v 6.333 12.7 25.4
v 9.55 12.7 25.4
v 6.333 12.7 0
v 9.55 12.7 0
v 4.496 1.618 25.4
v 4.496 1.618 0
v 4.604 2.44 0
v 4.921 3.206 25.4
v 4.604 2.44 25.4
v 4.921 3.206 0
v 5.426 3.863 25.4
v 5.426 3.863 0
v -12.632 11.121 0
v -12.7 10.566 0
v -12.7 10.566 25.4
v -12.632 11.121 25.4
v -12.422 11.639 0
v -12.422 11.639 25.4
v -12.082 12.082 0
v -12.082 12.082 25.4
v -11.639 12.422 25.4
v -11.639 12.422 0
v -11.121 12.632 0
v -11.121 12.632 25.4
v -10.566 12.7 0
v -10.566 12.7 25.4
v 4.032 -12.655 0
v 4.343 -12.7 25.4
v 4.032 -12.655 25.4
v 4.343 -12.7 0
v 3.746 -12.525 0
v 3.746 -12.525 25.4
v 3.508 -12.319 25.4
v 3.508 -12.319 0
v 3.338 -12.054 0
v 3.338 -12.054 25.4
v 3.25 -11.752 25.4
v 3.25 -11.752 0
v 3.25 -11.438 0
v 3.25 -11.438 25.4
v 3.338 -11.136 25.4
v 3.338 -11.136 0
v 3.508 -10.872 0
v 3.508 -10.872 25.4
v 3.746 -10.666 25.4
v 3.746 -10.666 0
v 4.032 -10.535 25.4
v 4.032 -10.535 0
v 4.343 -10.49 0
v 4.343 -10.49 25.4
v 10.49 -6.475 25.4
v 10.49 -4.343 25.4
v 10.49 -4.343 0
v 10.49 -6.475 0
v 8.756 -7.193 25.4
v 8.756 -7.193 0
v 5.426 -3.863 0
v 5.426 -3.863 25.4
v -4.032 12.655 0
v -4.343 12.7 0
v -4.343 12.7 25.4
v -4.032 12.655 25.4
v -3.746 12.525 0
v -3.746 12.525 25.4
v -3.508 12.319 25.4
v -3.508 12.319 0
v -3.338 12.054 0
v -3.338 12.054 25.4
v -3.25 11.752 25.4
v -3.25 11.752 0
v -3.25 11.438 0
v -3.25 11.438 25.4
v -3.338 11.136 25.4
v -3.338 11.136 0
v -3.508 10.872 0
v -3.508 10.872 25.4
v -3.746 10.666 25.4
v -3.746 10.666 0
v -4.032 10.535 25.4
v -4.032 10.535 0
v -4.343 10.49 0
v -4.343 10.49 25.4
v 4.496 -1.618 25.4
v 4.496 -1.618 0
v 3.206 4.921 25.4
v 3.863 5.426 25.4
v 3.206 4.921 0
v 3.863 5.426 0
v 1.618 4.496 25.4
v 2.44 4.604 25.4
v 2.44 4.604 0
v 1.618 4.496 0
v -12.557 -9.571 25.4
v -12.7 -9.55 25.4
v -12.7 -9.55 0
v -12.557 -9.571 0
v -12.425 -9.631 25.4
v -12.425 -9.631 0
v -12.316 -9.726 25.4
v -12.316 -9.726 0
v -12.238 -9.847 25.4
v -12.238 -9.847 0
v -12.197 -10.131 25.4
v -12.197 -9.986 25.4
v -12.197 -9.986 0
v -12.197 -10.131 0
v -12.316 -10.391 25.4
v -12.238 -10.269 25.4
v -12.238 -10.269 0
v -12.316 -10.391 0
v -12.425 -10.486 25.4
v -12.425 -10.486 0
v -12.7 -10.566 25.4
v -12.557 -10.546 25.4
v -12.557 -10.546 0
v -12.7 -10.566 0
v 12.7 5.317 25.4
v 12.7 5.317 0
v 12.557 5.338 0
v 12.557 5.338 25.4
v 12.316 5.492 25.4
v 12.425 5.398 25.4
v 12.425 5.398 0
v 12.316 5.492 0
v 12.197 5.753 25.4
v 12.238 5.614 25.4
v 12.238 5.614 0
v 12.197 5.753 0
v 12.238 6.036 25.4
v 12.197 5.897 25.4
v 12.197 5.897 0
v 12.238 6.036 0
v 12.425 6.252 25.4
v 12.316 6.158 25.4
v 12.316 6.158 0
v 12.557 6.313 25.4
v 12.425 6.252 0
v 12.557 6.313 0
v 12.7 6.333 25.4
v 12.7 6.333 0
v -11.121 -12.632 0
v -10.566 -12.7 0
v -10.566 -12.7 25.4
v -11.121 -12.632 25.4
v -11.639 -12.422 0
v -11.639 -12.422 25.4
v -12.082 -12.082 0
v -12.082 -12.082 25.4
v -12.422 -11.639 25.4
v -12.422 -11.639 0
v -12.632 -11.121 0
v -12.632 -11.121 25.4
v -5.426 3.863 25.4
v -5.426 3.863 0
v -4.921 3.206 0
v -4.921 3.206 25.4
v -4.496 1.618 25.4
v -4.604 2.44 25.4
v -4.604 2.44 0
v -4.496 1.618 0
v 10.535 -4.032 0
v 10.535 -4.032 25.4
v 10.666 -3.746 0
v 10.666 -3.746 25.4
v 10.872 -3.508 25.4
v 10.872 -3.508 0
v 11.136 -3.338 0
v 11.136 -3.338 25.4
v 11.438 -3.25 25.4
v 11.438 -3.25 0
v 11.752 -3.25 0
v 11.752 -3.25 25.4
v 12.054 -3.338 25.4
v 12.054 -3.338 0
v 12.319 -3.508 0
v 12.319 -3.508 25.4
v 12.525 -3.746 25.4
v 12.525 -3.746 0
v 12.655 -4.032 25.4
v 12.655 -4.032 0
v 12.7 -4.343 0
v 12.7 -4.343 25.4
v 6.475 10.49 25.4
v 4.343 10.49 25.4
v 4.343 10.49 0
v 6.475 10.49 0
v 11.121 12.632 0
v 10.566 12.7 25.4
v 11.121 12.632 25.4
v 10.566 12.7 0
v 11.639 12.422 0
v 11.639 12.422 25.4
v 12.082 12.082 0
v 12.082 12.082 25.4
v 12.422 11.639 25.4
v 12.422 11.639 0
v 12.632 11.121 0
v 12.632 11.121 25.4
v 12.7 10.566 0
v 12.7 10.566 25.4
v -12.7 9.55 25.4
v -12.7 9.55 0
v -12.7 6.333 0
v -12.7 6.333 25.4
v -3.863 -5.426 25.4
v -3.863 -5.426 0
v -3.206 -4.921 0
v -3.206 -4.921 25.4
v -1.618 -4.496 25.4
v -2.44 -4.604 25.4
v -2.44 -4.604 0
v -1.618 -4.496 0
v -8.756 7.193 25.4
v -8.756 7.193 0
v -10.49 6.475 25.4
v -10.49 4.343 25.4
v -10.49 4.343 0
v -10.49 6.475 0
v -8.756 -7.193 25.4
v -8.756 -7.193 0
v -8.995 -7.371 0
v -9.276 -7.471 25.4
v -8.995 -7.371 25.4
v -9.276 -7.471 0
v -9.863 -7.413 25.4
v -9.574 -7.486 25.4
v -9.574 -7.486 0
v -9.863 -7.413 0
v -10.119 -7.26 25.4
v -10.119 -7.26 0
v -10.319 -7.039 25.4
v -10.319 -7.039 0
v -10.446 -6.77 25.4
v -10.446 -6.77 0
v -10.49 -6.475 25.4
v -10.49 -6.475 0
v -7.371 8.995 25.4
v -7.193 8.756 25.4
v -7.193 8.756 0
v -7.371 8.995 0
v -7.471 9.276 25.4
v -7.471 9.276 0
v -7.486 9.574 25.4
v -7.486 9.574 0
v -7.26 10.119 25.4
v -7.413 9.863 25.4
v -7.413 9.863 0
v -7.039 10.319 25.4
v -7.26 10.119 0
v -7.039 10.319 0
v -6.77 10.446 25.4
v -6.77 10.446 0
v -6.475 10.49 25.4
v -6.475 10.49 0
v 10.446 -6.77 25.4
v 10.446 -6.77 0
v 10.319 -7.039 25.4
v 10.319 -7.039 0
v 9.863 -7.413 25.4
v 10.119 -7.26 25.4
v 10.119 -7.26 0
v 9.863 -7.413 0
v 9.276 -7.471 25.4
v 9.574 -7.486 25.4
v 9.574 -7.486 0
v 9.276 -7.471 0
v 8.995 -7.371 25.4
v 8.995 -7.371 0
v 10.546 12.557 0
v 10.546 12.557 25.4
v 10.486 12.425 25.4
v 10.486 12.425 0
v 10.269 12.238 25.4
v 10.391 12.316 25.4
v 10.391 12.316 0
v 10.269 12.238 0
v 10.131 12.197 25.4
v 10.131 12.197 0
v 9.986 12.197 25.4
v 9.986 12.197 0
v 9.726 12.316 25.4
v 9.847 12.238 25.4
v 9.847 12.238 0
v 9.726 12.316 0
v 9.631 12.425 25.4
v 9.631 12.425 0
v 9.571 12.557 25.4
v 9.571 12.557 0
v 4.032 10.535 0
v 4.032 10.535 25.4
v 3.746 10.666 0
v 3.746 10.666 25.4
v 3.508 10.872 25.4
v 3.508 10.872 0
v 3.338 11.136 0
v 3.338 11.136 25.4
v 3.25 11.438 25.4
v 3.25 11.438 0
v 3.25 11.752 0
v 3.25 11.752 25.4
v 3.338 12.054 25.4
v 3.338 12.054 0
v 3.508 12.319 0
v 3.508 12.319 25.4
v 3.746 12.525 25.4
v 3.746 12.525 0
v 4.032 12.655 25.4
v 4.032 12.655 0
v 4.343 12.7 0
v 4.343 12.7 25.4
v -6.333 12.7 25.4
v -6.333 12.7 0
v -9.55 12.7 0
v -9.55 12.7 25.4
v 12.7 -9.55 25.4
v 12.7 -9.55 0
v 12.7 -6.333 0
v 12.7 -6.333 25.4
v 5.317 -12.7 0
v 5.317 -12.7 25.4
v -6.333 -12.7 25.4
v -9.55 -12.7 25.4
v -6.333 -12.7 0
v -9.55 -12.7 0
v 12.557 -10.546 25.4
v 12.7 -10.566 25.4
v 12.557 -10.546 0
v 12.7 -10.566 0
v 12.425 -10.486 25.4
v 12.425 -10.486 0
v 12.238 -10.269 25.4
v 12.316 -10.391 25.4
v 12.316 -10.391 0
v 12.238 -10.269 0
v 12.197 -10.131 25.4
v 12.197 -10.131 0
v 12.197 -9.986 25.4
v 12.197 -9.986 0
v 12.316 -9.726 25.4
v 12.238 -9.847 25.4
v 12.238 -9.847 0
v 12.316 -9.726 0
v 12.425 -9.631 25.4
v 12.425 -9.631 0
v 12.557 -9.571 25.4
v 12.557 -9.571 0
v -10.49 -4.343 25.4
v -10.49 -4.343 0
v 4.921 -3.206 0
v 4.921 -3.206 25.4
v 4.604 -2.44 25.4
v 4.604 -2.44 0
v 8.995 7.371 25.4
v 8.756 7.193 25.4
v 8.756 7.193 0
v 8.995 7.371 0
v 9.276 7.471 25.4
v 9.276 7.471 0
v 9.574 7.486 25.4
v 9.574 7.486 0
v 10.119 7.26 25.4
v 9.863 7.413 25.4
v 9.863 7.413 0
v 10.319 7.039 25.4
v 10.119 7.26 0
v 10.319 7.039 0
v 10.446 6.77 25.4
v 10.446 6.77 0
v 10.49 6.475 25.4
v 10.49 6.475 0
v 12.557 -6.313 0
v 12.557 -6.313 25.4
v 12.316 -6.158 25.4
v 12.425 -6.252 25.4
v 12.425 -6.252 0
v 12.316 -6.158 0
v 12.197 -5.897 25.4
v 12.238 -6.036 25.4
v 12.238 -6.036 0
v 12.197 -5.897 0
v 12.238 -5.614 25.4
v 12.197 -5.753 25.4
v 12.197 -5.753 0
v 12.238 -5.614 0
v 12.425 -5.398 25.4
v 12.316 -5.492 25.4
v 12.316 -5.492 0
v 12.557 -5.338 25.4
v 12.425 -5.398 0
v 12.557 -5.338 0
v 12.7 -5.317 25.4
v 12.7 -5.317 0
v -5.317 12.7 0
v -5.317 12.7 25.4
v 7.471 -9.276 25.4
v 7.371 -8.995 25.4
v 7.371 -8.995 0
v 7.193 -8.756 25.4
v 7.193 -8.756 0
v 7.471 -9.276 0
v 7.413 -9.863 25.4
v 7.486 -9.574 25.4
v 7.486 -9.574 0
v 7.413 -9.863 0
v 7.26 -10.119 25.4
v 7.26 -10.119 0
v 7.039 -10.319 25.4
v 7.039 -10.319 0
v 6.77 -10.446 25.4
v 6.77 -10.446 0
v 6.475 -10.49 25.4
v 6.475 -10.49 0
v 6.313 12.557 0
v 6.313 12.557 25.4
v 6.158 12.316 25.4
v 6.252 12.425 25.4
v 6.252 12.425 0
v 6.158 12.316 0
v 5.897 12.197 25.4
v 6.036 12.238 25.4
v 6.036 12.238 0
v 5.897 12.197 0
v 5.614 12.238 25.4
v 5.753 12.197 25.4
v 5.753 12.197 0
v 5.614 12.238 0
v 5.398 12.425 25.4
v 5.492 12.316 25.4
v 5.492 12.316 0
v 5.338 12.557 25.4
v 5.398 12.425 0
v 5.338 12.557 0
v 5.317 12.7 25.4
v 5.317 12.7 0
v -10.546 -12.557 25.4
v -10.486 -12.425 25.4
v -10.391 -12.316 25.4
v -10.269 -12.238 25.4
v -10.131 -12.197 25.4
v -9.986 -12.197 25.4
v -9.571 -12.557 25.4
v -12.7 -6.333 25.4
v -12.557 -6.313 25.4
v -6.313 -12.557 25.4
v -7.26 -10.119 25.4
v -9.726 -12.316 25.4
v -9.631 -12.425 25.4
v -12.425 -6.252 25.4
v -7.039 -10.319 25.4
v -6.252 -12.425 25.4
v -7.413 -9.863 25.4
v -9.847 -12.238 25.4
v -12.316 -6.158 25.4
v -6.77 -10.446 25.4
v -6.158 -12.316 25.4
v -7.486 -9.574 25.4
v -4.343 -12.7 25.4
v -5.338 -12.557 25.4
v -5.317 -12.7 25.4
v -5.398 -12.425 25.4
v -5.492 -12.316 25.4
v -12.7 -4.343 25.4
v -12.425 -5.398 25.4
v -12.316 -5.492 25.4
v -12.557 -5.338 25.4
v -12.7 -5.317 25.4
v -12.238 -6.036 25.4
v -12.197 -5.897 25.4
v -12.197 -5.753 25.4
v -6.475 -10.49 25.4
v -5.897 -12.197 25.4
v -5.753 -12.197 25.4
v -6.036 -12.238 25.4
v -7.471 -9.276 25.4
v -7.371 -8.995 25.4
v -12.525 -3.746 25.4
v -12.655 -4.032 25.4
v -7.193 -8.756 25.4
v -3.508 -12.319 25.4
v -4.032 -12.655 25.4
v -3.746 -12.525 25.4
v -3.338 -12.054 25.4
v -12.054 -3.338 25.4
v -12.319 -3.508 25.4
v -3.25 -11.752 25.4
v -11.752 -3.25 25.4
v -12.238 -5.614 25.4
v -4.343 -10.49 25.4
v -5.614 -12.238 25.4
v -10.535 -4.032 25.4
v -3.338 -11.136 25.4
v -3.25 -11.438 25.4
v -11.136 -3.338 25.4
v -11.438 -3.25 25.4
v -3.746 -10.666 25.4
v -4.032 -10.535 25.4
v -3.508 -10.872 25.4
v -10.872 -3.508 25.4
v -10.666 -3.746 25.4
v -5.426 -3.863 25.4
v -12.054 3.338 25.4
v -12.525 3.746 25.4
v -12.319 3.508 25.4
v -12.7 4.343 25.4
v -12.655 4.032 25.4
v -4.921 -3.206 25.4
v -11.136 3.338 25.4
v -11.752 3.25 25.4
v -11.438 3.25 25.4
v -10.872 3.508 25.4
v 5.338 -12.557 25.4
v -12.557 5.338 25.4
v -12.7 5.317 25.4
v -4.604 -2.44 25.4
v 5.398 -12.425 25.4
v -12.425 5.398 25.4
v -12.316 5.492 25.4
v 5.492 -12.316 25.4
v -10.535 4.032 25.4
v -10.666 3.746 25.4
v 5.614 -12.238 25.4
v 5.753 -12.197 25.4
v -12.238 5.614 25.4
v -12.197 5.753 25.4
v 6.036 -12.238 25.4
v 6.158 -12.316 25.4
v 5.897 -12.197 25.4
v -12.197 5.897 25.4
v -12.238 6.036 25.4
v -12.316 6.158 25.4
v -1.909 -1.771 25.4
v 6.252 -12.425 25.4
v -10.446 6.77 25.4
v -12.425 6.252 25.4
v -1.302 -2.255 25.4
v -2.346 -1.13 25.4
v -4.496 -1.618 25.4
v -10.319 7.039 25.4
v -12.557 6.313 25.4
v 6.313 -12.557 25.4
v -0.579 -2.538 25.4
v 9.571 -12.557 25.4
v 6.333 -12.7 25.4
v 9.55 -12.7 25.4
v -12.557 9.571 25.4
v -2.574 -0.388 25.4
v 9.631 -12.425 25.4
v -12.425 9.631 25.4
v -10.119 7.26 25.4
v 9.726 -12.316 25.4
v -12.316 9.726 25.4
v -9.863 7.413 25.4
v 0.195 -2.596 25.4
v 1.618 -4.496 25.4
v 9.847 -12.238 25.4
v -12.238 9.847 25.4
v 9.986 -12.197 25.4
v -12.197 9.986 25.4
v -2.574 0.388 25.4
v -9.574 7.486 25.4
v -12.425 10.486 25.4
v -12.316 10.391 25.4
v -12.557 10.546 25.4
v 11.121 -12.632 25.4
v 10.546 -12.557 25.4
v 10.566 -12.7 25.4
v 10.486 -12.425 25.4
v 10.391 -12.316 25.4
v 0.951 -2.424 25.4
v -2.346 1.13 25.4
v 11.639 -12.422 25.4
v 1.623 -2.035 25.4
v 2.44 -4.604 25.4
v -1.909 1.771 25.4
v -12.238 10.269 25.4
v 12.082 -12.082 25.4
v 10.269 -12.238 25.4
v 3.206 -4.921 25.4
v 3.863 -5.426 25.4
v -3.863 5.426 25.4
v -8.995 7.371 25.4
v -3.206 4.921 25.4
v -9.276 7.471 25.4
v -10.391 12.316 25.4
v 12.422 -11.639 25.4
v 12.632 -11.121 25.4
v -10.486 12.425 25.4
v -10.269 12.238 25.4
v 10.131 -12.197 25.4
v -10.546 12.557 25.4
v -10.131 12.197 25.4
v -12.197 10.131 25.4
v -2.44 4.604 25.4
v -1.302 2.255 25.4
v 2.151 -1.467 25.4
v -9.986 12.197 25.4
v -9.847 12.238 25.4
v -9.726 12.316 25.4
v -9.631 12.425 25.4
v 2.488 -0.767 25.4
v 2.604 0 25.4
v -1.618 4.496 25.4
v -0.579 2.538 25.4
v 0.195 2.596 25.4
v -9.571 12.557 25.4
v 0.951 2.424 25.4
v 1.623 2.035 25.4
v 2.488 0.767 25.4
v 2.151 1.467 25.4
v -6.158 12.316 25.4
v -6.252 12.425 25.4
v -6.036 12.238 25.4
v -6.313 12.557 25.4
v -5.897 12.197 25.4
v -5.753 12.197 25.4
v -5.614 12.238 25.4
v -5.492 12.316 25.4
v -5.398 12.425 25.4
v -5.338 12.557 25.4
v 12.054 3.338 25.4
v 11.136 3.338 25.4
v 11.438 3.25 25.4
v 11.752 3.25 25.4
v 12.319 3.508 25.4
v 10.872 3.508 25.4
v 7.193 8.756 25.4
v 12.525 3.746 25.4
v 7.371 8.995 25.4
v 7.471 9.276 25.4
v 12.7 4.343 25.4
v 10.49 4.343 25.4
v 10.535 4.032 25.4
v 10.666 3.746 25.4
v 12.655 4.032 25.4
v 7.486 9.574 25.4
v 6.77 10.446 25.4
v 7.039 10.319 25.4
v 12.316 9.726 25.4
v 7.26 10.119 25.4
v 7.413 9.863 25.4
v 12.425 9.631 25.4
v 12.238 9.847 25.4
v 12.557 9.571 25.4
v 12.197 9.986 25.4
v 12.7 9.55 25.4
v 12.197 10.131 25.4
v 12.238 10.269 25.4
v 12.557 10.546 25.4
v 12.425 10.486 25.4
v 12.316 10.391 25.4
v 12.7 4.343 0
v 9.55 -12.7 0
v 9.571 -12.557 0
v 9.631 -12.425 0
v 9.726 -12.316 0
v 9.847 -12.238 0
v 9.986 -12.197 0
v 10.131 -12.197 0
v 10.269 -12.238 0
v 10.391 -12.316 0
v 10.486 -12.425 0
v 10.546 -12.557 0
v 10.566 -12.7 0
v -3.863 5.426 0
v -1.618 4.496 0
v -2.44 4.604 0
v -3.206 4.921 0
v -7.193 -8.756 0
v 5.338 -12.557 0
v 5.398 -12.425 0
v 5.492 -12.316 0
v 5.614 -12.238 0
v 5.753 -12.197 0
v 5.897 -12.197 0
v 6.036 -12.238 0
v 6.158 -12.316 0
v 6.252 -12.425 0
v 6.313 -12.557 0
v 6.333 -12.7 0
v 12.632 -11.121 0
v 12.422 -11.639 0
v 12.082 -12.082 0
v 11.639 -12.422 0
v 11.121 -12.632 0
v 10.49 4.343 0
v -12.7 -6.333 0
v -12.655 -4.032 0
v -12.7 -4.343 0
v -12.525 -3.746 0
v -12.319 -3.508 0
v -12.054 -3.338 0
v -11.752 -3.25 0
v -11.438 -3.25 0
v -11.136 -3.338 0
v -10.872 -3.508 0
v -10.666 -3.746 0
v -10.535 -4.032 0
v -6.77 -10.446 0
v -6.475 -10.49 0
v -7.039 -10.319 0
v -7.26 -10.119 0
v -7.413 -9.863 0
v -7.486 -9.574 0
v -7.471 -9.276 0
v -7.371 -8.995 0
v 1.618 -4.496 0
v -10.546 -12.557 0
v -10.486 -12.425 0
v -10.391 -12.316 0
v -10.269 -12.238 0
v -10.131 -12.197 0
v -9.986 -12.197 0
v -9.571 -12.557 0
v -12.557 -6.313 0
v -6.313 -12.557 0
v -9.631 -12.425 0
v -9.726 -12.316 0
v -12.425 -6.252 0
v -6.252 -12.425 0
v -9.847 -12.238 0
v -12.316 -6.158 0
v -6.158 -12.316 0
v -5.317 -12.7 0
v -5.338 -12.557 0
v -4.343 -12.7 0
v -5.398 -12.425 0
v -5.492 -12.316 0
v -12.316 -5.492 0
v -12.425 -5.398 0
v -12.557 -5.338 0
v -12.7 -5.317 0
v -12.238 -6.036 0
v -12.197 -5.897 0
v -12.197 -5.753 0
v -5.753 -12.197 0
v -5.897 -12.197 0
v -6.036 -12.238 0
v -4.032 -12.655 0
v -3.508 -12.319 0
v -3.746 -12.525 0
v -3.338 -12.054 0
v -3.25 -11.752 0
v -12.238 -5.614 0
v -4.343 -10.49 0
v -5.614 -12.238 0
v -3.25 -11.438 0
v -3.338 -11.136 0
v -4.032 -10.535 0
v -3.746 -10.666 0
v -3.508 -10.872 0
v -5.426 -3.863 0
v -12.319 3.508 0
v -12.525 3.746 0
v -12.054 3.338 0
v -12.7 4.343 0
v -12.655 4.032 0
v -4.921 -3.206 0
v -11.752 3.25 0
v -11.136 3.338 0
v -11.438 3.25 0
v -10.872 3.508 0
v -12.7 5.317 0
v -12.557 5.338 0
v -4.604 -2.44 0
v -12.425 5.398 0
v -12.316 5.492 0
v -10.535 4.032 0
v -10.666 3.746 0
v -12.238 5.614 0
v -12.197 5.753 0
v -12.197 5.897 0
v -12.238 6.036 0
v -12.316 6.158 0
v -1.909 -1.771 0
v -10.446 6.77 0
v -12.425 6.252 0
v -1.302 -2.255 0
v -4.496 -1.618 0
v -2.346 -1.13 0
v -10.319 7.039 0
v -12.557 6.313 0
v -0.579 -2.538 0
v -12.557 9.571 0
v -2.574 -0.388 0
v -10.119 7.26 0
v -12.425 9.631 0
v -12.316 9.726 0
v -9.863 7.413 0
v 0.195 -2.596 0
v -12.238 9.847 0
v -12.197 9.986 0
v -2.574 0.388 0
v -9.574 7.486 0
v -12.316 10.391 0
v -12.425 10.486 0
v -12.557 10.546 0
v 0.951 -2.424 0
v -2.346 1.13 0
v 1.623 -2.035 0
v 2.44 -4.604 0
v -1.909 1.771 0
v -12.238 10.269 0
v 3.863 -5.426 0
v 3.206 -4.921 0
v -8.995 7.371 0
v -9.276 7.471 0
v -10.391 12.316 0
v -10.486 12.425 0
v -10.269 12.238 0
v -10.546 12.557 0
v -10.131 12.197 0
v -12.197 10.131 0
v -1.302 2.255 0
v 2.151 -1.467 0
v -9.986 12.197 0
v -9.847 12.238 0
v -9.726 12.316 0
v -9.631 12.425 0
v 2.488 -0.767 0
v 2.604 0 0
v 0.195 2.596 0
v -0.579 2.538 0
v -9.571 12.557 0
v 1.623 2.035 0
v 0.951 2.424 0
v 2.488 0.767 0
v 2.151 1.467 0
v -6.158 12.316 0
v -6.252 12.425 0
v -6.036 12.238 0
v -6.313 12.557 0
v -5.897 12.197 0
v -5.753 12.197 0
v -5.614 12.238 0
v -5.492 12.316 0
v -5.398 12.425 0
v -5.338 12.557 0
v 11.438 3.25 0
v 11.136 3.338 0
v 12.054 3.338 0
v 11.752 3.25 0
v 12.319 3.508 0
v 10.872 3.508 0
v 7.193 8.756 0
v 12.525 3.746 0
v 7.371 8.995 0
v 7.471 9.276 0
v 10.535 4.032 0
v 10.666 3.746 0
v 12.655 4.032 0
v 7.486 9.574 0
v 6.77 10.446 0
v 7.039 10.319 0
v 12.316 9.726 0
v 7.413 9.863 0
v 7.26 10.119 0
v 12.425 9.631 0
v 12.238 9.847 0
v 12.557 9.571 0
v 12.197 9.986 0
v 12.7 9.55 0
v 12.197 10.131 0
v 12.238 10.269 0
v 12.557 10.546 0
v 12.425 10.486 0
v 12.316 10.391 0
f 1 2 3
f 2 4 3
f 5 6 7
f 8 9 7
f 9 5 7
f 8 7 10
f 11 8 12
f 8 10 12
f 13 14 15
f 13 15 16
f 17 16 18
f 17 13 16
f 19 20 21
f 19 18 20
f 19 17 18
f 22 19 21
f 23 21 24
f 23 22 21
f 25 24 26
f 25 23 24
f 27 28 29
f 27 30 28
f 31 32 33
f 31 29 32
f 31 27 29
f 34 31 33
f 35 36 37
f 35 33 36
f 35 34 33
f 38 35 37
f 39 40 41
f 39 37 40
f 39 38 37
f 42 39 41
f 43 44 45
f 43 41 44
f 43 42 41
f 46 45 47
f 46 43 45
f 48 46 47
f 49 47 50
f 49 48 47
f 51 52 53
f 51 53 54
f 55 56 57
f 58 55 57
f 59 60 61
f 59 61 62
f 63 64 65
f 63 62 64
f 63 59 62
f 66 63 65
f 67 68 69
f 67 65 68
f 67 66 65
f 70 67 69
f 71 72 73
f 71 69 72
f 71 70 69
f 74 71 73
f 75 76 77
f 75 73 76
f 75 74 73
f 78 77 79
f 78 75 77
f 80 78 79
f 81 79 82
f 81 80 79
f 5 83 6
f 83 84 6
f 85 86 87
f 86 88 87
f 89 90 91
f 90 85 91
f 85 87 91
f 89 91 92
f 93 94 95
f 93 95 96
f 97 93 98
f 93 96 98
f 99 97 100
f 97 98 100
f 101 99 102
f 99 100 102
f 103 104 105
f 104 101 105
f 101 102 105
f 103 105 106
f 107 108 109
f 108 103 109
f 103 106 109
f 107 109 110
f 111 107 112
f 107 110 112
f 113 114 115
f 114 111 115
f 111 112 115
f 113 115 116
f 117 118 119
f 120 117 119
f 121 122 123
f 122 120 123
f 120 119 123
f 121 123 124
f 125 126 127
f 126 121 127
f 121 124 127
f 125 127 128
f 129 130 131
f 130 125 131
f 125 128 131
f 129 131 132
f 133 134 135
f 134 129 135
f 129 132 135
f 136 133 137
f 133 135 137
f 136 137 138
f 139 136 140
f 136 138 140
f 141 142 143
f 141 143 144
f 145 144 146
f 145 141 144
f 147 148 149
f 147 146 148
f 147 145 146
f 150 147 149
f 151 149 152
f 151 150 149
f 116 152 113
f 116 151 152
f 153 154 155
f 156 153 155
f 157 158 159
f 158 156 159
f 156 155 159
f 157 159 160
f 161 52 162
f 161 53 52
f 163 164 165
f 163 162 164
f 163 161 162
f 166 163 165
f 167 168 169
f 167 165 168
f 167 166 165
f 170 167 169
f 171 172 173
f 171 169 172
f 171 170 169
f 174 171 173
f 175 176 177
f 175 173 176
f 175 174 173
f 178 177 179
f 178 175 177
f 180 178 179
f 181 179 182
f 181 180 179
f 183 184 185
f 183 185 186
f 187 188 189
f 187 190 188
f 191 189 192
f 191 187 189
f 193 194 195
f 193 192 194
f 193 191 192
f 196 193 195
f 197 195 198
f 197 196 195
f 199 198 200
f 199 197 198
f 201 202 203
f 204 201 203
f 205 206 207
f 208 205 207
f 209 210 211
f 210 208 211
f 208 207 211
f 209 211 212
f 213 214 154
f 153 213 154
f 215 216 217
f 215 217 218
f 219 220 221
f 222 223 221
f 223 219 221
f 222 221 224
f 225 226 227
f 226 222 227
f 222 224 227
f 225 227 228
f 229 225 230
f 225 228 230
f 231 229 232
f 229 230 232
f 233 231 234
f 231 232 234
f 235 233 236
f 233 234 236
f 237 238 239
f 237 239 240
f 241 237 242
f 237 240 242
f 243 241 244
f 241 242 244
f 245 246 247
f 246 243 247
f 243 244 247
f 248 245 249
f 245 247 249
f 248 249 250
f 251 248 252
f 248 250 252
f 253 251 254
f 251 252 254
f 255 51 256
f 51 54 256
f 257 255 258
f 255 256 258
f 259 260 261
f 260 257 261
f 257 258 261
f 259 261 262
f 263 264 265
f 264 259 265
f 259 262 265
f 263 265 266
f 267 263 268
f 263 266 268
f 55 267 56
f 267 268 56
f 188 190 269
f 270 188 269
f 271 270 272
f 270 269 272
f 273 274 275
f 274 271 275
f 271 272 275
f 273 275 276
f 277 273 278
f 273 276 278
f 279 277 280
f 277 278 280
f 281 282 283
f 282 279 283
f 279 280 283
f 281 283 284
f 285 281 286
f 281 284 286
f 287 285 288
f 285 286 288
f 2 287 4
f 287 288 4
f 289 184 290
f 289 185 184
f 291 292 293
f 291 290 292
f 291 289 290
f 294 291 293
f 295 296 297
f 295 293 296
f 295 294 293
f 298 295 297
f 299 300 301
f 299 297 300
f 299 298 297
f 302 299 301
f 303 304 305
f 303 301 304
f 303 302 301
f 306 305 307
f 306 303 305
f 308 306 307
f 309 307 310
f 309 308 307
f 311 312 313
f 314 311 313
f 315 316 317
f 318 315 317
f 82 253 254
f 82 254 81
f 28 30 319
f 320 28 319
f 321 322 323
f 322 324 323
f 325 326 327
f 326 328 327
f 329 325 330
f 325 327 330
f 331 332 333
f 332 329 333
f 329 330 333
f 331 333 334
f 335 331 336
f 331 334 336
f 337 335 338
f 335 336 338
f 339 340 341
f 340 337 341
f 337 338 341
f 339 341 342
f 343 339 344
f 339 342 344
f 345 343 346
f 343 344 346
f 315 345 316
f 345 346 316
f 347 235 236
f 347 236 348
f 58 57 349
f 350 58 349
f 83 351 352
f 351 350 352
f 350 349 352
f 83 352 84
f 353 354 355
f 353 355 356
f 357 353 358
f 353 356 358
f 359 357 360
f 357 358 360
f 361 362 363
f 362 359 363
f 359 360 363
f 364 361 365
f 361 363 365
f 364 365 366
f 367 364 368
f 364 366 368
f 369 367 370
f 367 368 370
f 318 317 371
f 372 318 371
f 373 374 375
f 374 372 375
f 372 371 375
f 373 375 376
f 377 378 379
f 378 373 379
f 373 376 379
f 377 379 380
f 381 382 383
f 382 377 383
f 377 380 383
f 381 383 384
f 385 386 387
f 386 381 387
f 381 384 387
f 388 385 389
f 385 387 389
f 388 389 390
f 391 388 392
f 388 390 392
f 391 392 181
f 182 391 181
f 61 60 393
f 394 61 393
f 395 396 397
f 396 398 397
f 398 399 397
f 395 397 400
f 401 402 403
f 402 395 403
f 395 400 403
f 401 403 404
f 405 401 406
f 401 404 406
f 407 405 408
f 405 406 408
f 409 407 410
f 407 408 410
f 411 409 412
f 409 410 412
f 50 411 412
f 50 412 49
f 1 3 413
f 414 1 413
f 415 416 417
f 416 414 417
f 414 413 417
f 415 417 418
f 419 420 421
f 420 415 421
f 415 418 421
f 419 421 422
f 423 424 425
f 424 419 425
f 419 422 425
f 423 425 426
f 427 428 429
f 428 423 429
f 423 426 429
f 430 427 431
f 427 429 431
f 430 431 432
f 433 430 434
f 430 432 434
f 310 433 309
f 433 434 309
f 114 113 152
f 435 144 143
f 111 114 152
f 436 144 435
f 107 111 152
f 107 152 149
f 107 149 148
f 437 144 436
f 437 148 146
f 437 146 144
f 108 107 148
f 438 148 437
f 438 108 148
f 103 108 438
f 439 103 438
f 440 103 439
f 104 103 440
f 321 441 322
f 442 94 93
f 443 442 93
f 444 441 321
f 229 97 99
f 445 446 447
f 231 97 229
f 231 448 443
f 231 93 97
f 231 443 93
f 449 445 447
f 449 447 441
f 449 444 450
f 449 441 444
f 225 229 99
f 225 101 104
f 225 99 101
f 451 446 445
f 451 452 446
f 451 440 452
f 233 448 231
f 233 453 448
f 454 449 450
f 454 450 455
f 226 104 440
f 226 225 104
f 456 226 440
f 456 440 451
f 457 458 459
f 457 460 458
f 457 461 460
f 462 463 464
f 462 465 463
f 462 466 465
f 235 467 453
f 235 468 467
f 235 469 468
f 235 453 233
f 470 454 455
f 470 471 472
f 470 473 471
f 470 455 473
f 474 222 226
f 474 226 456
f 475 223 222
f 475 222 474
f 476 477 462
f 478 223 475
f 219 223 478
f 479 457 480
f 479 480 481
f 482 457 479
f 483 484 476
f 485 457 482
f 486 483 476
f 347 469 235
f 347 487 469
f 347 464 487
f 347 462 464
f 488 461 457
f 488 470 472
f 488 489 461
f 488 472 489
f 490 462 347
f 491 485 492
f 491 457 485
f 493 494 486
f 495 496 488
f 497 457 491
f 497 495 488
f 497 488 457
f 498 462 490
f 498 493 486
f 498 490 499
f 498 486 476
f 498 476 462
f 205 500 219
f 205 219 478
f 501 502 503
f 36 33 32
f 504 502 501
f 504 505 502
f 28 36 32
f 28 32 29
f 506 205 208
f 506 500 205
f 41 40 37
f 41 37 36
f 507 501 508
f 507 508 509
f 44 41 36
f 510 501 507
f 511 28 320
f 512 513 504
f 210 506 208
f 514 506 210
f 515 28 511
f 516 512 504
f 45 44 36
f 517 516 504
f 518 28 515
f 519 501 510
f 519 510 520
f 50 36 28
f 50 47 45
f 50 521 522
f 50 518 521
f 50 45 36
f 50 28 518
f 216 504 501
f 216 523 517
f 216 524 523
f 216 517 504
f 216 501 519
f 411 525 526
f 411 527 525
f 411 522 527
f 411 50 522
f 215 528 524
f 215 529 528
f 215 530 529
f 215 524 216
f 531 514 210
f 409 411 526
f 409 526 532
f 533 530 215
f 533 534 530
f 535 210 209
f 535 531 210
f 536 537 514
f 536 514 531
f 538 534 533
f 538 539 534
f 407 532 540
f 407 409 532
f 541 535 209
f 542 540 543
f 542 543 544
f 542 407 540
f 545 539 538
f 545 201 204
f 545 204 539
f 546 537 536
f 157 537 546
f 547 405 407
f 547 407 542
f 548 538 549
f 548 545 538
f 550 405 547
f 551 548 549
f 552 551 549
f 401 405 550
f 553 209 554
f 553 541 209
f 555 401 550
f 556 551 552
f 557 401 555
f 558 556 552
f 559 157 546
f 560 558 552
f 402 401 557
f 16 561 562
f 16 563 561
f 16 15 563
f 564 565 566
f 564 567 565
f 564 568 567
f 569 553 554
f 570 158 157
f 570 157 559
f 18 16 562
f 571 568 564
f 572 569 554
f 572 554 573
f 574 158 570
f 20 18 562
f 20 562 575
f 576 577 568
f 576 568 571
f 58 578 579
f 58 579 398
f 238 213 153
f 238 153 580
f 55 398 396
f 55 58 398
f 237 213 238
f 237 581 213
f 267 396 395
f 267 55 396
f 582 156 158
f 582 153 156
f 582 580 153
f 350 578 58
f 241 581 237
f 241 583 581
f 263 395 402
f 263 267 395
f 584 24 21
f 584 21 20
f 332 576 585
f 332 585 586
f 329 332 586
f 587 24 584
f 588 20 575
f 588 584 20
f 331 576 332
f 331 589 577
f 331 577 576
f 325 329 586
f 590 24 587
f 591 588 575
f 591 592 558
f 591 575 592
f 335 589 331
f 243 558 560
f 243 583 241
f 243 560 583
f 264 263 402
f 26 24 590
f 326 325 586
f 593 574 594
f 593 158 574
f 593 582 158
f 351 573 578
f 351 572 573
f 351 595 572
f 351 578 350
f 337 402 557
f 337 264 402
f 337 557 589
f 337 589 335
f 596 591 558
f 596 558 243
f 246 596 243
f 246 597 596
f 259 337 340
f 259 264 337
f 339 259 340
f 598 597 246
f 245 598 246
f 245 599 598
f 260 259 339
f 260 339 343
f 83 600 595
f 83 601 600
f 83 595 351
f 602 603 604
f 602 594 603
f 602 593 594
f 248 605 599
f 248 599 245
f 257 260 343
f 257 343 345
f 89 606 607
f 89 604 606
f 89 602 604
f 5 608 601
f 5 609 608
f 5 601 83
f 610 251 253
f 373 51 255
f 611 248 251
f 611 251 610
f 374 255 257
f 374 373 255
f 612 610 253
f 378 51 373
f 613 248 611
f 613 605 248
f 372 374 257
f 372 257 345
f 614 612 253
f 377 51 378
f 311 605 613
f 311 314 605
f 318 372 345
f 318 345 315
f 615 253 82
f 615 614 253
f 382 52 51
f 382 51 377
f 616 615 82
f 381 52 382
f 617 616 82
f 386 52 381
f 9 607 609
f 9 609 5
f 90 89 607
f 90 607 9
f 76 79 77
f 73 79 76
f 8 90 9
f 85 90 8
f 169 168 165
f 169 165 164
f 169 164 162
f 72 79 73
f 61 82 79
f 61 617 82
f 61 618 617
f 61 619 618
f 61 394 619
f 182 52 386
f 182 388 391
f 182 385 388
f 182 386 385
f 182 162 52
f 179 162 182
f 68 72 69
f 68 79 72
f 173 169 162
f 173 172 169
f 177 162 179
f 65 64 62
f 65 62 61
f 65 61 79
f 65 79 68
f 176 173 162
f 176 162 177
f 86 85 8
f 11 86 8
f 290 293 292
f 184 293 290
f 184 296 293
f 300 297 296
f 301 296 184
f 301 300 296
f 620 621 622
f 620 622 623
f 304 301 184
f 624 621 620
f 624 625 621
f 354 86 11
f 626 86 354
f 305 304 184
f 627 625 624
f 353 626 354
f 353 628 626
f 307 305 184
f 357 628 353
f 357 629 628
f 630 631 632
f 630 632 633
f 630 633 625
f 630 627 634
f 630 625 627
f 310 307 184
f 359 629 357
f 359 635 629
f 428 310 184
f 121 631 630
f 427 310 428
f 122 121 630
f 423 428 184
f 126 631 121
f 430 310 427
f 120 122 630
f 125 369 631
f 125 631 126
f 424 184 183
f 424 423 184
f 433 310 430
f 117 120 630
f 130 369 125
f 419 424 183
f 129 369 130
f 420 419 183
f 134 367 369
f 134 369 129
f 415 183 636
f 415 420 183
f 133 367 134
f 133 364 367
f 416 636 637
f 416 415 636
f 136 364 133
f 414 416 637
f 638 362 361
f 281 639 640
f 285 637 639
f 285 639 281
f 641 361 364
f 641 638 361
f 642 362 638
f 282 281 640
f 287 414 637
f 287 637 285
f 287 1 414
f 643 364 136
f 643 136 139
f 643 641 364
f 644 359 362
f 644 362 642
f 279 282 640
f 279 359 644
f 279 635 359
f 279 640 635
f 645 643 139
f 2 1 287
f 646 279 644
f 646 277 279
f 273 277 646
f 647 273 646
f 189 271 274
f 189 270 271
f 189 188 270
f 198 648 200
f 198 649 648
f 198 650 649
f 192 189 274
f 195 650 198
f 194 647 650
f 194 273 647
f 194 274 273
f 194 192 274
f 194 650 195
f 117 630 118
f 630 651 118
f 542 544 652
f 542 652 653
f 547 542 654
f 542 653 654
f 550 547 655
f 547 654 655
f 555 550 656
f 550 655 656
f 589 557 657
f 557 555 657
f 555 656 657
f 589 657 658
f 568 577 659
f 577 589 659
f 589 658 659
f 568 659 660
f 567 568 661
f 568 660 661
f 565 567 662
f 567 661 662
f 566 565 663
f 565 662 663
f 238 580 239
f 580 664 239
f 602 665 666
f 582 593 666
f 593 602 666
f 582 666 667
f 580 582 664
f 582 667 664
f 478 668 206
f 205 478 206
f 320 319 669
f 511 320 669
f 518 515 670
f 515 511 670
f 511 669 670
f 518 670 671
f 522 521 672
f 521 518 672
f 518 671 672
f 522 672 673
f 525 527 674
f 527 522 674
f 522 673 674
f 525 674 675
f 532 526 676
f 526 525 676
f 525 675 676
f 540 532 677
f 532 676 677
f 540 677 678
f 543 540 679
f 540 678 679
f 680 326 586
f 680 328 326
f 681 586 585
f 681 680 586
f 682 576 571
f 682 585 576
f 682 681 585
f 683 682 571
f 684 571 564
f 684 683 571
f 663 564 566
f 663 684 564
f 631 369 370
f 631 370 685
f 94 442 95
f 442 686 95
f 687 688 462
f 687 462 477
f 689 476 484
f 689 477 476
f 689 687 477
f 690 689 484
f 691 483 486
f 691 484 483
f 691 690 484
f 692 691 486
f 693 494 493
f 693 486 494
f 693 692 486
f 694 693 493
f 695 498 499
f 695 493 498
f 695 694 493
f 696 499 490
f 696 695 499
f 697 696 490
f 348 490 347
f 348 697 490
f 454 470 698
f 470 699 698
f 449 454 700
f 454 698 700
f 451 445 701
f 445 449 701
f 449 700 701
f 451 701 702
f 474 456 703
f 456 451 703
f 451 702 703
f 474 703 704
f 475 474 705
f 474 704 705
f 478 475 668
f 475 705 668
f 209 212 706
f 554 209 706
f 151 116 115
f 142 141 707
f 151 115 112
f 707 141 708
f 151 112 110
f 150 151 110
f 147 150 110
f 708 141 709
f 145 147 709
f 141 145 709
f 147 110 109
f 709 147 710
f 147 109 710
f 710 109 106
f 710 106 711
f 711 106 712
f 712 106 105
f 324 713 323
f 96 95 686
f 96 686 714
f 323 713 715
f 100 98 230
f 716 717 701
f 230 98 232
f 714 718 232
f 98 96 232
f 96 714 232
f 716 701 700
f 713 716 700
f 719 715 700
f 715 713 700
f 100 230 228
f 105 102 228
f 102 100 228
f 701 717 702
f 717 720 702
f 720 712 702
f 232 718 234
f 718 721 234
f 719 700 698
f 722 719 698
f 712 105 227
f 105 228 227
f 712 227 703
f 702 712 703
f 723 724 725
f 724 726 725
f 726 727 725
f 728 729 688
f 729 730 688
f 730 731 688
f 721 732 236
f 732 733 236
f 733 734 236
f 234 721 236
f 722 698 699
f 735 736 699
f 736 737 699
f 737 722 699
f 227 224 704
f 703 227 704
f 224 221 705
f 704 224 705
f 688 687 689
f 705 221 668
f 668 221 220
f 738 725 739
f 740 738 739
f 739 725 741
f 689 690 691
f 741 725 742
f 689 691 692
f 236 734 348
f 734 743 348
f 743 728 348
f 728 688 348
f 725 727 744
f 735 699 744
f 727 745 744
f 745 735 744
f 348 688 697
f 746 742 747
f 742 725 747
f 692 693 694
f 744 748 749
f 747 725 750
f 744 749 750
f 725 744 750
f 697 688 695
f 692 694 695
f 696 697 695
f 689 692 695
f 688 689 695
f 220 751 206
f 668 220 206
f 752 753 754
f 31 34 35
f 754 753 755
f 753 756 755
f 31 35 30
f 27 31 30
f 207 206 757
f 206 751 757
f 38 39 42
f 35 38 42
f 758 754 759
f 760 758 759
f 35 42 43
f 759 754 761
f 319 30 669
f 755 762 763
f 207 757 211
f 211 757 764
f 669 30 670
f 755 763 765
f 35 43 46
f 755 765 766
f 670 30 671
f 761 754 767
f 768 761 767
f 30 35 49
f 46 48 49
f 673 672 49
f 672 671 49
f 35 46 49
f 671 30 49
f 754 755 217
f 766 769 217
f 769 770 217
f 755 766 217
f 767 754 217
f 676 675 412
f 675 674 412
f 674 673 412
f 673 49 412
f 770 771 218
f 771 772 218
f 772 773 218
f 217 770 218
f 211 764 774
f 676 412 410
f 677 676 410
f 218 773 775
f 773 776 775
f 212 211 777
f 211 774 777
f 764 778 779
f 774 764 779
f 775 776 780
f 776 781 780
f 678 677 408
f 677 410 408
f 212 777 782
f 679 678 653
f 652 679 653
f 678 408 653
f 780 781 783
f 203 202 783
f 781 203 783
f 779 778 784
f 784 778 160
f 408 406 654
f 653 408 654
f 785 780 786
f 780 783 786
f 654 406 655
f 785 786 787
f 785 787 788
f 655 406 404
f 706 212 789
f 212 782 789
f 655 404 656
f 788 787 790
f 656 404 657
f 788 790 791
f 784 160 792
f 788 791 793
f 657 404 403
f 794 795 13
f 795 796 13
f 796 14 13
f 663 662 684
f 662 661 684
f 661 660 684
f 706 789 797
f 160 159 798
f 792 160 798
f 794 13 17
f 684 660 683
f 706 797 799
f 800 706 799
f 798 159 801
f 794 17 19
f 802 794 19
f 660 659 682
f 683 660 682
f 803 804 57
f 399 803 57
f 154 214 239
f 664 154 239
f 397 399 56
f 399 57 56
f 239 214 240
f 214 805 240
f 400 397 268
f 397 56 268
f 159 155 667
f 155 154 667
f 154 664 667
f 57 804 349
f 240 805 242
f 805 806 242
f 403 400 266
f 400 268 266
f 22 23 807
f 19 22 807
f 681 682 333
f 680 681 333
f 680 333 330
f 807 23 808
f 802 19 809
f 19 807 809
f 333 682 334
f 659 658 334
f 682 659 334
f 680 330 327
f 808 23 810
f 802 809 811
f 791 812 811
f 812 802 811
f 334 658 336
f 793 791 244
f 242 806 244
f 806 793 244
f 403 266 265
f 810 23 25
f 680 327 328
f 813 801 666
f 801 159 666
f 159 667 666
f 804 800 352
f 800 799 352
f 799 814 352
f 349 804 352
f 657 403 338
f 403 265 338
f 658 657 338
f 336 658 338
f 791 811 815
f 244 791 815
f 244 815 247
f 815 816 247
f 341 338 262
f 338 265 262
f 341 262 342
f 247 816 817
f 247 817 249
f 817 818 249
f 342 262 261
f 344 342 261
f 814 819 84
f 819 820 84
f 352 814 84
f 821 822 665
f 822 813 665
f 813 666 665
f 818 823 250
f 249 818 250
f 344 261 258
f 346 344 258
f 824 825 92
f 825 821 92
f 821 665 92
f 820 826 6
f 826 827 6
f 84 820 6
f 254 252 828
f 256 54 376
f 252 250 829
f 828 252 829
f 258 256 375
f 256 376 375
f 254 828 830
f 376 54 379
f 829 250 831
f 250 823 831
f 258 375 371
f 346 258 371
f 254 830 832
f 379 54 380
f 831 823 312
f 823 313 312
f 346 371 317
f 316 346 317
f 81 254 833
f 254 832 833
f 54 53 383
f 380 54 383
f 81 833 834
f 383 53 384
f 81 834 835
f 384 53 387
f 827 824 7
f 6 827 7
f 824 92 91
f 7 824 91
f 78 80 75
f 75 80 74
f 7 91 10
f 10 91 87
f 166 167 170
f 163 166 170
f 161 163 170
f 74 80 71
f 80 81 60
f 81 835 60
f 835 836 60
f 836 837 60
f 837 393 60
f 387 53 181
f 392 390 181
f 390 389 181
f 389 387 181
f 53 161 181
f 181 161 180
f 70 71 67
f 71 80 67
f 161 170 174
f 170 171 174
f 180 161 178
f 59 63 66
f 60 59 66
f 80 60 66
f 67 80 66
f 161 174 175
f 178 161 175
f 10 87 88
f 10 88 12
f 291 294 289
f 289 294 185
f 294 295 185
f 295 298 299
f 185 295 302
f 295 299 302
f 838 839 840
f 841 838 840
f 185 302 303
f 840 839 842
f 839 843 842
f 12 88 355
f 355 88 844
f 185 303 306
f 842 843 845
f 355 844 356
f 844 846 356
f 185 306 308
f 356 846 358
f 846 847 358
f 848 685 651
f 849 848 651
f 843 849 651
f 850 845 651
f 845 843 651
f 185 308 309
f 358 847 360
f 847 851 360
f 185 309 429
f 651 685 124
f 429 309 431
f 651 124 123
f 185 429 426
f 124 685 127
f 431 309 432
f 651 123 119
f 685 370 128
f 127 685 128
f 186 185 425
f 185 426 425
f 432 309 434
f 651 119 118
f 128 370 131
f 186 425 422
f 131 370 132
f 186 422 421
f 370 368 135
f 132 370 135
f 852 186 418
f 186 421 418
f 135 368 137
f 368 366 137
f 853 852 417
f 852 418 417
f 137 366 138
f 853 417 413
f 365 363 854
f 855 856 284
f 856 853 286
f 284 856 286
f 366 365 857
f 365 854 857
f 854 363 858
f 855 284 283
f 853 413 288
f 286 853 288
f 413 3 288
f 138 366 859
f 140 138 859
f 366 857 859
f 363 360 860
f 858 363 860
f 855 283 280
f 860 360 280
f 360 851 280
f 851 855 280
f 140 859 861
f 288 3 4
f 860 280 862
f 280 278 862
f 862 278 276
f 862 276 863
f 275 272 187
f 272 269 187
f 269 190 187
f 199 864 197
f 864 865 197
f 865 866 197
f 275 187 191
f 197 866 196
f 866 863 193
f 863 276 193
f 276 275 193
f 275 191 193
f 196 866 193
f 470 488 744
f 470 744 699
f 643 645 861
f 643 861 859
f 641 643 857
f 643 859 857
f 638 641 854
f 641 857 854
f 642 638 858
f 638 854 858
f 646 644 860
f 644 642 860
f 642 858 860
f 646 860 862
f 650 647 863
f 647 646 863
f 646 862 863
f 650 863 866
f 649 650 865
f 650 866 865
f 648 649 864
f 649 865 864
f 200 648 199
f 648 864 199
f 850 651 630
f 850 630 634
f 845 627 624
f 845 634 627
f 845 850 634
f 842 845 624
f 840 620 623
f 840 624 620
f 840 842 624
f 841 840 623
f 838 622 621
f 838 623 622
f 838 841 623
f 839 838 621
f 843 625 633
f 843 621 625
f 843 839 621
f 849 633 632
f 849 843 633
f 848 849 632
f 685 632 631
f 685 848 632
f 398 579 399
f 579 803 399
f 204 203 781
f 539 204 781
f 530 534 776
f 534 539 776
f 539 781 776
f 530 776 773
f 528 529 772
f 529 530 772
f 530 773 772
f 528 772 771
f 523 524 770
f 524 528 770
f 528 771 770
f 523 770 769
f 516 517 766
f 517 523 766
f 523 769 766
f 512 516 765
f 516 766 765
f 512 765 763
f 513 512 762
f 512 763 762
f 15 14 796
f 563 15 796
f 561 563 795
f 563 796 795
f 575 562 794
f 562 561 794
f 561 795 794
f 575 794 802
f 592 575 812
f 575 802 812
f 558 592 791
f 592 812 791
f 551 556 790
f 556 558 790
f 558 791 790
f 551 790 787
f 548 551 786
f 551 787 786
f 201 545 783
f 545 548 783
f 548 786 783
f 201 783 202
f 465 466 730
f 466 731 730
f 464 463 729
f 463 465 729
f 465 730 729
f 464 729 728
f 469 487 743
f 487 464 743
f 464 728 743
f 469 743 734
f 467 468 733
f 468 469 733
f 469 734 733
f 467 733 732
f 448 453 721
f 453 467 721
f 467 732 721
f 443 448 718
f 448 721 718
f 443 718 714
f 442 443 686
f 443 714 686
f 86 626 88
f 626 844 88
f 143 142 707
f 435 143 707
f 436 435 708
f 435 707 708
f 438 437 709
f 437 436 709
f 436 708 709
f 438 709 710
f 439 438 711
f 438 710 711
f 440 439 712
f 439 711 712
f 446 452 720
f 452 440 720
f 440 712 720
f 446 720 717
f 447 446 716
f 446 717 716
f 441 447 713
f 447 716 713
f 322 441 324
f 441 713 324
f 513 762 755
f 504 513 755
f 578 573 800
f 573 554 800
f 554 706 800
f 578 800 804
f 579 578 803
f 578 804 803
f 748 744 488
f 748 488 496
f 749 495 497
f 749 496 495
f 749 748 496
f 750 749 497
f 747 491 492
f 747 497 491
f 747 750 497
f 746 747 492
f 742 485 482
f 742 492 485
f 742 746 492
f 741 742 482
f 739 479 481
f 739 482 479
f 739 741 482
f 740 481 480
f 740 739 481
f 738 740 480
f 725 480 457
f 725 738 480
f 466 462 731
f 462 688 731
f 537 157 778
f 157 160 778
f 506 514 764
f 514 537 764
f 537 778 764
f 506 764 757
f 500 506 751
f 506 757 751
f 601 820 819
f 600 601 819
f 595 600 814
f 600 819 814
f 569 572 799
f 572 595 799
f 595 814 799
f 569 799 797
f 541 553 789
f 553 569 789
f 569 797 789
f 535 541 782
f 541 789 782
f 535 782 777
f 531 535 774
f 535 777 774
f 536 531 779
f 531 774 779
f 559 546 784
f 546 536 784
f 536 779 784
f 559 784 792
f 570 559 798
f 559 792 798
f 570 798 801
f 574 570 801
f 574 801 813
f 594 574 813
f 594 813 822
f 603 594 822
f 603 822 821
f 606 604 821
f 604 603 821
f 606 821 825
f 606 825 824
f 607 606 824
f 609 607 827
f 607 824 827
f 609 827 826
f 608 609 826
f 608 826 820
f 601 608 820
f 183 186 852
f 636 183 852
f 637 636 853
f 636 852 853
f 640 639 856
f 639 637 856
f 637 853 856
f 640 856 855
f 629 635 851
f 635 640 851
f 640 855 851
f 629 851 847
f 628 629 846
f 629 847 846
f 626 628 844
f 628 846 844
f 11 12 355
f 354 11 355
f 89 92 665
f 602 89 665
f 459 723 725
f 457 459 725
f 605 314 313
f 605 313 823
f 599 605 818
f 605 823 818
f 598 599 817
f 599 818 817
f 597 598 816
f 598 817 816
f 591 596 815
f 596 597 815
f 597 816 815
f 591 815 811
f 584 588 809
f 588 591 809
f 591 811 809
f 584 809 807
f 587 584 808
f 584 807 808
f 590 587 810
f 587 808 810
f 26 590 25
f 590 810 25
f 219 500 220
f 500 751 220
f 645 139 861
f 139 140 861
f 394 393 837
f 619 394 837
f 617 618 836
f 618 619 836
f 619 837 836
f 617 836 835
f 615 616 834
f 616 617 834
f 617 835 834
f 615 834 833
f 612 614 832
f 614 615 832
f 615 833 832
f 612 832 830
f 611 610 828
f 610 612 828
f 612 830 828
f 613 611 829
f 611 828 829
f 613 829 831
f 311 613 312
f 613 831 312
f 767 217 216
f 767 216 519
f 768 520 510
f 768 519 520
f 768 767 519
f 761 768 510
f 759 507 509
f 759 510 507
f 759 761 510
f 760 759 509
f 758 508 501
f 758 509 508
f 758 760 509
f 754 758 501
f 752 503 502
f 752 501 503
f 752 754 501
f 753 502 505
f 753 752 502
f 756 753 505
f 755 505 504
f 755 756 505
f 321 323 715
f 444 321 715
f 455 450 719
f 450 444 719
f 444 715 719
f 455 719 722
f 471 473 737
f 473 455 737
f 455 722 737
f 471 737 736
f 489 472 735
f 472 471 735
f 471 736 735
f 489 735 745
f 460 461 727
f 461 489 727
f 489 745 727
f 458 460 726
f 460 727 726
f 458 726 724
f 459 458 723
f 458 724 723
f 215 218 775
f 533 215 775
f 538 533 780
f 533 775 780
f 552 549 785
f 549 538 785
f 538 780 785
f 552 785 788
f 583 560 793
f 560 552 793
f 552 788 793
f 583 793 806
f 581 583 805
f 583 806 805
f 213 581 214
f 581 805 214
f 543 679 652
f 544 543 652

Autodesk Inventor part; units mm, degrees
ref_plane "YZ Plane" through (0, 0, 0) normal (1, 0, 0) x (0, 1, 0)
ref_plane "XZ Plane" through (0, 0, 0) normal (0, 1, 0) x (-1, 0, 0)
ref_plane "XY Plane" through (0, 0, 0) normal (0, 0, 1) x (1, 0, 0)
sketch "Sketch1" plane through (0, 0, 0) normal (0, 0, 1) x (1, 0, 0)
  arc A0 (-12.6998, -10.5664) -> (-10.5664, -12.6998) centre (-10.5918, -10.5918) ccw
  arc A1 (-9.5504, -12.7) -> (-10.5664, -12.6998) centre (-10.0584, -12.7) ccw
  line L0 (-9.5504, -12.7) -> (-6.3331, -12.7)
  arc A2 (-5.3171, -12.7) -> (-6.3331, -12.7) centre (-5.8251, -12.7) ccw
  line L1 (-5.3171, -12.7) -> (-4.3434, -12.7)
  arc A3 (-4.3434, -12.7) -> (-4.3434, -10.4902) centre (-4.3434, -11.5951) ccw
  line L2 (-4.3434, -10.4902) -> (-6.4748, -10.4902)
  arc A4 (-7.1932, -8.7558) -> (-6.4748, -10.4902) centre (-6.4748, -9.4742) ccw
  line L3 (-7.1932, -8.7558) -> (-3.8632, -5.4257)
  arc A5 (-1.6181, -4.4958) -> (-3.8632, -5.4257) centre (-1.6181, -7.6708) ccw
  line L4 (-1.6181, -4.4958) -> (1.6181, -4.4958)
  arc A6 (3.8632, -5.4257) -> (1.6181, -4.4958) centre (1.6181, -7.6708) ccw
  line L5 (3.8632, -5.4257) -> (7.1932, -8.7558)
  arc A7 (6.4748, -10.4902) -> (7.1932, -8.7558) centre (6.4748, -9.4742) ccw
  line L6 (6.4748, -10.4902) -> (4.3434, -10.4902)
  arc A8 (4.3434, -10.4902) -> (4.3434, -12.7) centre (4.3434, -11.5951) ccw
  line L7 (4.3434, -12.7) -> (5.3171, -12.7)
  arc A9 (6.3331, -12.7) -> (5.3171, -12.7) centre (5.8251, -12.7) ccw
  line L8 (6.3331, -12.7) -> (9.5504, -12.7)
  arc A10 (10.5664, -12.6998) -> (9.5504, -12.7) centre (10.0584, -12.7) ccw
  arc A11 (10.5664, -12.6998) -> (12.6998, -10.5664) centre (10.5918, -10.5918) ccw
  arc A12 (12.7, -9.5504) -> (12.6998, -10.5664) centre (12.7, -10.0584) ccw
  line L9 (12.7, -9.5504) -> (12.7, -6.3331)
  arc A13 (12.7, -5.3171) -> (12.7, -6.3331) centre (12.7, -5.8251) ccw
  line L10 (12.7, -5.3171) -> (12.7, -4.3434)
  arc A14 (12.7, -4.3434) -> (10.4902, -4.3434) centre (11.5951, -4.3434) ccw
  line L11 (10.4902, -4.3434) -> (10.4902, -6.4748)
  arc A15 (8.7558, -7.1932) -> (10.4902, -6.4748) centre (9.4742, -6.4748) ccw
  line L12 (8.7558, -7.1932) -> (5.4257, -3.8632)
  arc A16 (4.4958, -1.6181) -> (5.4257, -3.8632) centre (7.6708, -1.6181) ccw
  line L13 (4.4958, -1.6181) -> (4.4958, 1.6181)
  arc A17 (5.4257, 3.8632) -> (4.4958, 1.6181) centre (7.6708, 1.6181) ccw
  line L14 (5.4257, 3.8632) -> (8.7558, 7.1932)
  arc A18 (10.4902, 6.4748) -> (8.7558, 7.1932) centre (9.4742, 6.4748) ccw
  line L15 (10.4902, 6.4748) -> (10.4902, 4.3434)
  arc A19 (10.4902, 4.3434) -> (12.7, 4.3434) centre (11.5951, 4.3434) ccw
  line L16 (12.7, 4.3434) -> (12.7, 5.3171)
  arc A20 (12.7, 6.3331) -> (12.7, 5.3171) centre (12.7, 5.8251) ccw
  line L17 (12.7, 6.3331) -> (12.7, 9.5504)
  arc A21 (12.6998, 10.5664) -> (12.7, 9.5504) centre (12.7, 10.0584) ccw
  arc A22 (12.6998, 10.5664) -> (10.5664, 12.6998) centre (10.5918, 10.5918) ccw
  arc A23 (9.5504, 12.7) -> (10.5664, 12.6998) centre (10.0584, 12.7) ccw
  line L18 (9.5504, 12.7) -> (6.3331, 12.7)
  arc A24 (5.3171, 12.7) -> (6.3331, 12.7) centre (5.8251, 12.7) ccw
  line L19 (5.3171, 12.7) -> (4.3434, 12.7)
  arc A25 (4.3434, 12.7) -> (4.3434, 10.4902) centre (4.3434, 11.5951) ccw
  line L20 (4.3434, 10.4902) -> (6.4748, 10.4902)
  arc A26 (7.1932, 8.7558) -> (6.4748, 10.4902) centre (6.4748, 9.4742) ccw
  line L21 (7.1932, 8.7558) -> (3.8632, 5.4257)
  arc A27 (1.6181, 4.4958) -> (3.8632, 5.4257) centre (1.6181, 7.6708) ccw
  line L22 (1.6181, 4.4958) -> (-1.6181, 4.4958)
  arc A28 (-3.8632, 5.4257) -> (-1.6181, 4.4958) centre (-1.6181, 7.6708) ccw
  line L23 (-3.8632, 5.4257) -> (-7.1932, 8.7558)
  arc A29 (-6.4748, 10.4902) -> (-7.1932, 8.7558) centre (-6.4748, 9.4742) ccw
  line L24 (-6.4748, 10.4902) -> (-4.3434, 10.4902)
  arc A30 (-4.3434, 10.4902) -> (-4.3434, 12.7) centre (-4.3434, 11.5951) ccw
  line L25 (-4.3434, 12.7) -> (-5.3171, 12.7)
  arc A31 (-6.3331, 12.7) -> (-5.3171, 12.7) centre (-5.8251, 12.7) ccw
  line L26 (-6.3331, 12.7) -> (-9.5504, 12.7)
  arc A32 (-10.5664, 12.6998) -> (-9.5504, 12.7) centre (-10.0584, 12.7) ccw
  arc A33 (-10.5664, 12.6998) -> (-12.6998, 10.5664) centre (-10.5918, 10.5918) ccw
  arc A34 (-12.7, 9.5504) -> (-12.6998, 10.5664) centre (-12.7, 10.0584) ccw
  line L27 (-12.7, 9.5504) -> (-12.7, 6.3331)
  arc A35 (-12.7, 5.3171) -> (-12.7, 6.3331) centre (-12.7, 5.8251) ccw
  line L28 (-12.7, 5.3171) -> (-12.7, 4.3434)
  arc A36 (-12.7, 4.3434) -> (-10.4902, 4.3434) centre (-11.5951, 4.3434) ccw
  line L29 (-10.4902, 4.3434) -> (-10.4902, 6.4748)
  arc A37 (-8.7558, 7.1932) -> (-10.4902, 6.4748) centre (-9.4742, 6.4748) ccw
  line L30 (-8.7558, 7.1932) -> (-5.4257, 3.8632)
  arc A38 (-4.4958, 1.6181) -> (-5.4257, 3.8632) centre (-7.6708, 1.6181) ccw
  line L31 (-4.4958, 1.6181) -> (-4.4958, -1.6181)
  arc A39 (-5.4257, -3.8632) -> (-4.4958, -1.6181) centre (-7.6708, -1.6181) ccw
  line L32 (-5.4257, -3.8632) -> (-8.7558, -7.1932)
  arc A40 (-10.4902, -6.4748) -> (-8.7558, -7.1932) centre (-9.4742, -6.4748) ccw
  line L33 (-10.4902, -6.4748) -> (-10.4902, -4.3434)
  arc A41 (-10.4902, -4.3434) -> (-12.7, -4.3434) centre (-11.5951, -4.3434) ccw
  line L34 (-12.7, -4.3434) -> (-12.7, -5.3171)
  arc A42 (-12.7, -6.3331) -> (-12.7, -5.3171) centre (-12.7, -5.8251) ccw
  line L35 (-12.7, -6.3331) -> (-12.7, -9.5504)
  arc A43 (-12.6998, -10.5664) -> (-12.7, -9.5504) centre (-12.7, -10.0584) ccw
  circle A44 centre (0, 0) radius 2.6035
extrude "Extrusion1" add sketch "Sketch1" along normal blind 25.4
properties part number "1010-3.125-CL"
